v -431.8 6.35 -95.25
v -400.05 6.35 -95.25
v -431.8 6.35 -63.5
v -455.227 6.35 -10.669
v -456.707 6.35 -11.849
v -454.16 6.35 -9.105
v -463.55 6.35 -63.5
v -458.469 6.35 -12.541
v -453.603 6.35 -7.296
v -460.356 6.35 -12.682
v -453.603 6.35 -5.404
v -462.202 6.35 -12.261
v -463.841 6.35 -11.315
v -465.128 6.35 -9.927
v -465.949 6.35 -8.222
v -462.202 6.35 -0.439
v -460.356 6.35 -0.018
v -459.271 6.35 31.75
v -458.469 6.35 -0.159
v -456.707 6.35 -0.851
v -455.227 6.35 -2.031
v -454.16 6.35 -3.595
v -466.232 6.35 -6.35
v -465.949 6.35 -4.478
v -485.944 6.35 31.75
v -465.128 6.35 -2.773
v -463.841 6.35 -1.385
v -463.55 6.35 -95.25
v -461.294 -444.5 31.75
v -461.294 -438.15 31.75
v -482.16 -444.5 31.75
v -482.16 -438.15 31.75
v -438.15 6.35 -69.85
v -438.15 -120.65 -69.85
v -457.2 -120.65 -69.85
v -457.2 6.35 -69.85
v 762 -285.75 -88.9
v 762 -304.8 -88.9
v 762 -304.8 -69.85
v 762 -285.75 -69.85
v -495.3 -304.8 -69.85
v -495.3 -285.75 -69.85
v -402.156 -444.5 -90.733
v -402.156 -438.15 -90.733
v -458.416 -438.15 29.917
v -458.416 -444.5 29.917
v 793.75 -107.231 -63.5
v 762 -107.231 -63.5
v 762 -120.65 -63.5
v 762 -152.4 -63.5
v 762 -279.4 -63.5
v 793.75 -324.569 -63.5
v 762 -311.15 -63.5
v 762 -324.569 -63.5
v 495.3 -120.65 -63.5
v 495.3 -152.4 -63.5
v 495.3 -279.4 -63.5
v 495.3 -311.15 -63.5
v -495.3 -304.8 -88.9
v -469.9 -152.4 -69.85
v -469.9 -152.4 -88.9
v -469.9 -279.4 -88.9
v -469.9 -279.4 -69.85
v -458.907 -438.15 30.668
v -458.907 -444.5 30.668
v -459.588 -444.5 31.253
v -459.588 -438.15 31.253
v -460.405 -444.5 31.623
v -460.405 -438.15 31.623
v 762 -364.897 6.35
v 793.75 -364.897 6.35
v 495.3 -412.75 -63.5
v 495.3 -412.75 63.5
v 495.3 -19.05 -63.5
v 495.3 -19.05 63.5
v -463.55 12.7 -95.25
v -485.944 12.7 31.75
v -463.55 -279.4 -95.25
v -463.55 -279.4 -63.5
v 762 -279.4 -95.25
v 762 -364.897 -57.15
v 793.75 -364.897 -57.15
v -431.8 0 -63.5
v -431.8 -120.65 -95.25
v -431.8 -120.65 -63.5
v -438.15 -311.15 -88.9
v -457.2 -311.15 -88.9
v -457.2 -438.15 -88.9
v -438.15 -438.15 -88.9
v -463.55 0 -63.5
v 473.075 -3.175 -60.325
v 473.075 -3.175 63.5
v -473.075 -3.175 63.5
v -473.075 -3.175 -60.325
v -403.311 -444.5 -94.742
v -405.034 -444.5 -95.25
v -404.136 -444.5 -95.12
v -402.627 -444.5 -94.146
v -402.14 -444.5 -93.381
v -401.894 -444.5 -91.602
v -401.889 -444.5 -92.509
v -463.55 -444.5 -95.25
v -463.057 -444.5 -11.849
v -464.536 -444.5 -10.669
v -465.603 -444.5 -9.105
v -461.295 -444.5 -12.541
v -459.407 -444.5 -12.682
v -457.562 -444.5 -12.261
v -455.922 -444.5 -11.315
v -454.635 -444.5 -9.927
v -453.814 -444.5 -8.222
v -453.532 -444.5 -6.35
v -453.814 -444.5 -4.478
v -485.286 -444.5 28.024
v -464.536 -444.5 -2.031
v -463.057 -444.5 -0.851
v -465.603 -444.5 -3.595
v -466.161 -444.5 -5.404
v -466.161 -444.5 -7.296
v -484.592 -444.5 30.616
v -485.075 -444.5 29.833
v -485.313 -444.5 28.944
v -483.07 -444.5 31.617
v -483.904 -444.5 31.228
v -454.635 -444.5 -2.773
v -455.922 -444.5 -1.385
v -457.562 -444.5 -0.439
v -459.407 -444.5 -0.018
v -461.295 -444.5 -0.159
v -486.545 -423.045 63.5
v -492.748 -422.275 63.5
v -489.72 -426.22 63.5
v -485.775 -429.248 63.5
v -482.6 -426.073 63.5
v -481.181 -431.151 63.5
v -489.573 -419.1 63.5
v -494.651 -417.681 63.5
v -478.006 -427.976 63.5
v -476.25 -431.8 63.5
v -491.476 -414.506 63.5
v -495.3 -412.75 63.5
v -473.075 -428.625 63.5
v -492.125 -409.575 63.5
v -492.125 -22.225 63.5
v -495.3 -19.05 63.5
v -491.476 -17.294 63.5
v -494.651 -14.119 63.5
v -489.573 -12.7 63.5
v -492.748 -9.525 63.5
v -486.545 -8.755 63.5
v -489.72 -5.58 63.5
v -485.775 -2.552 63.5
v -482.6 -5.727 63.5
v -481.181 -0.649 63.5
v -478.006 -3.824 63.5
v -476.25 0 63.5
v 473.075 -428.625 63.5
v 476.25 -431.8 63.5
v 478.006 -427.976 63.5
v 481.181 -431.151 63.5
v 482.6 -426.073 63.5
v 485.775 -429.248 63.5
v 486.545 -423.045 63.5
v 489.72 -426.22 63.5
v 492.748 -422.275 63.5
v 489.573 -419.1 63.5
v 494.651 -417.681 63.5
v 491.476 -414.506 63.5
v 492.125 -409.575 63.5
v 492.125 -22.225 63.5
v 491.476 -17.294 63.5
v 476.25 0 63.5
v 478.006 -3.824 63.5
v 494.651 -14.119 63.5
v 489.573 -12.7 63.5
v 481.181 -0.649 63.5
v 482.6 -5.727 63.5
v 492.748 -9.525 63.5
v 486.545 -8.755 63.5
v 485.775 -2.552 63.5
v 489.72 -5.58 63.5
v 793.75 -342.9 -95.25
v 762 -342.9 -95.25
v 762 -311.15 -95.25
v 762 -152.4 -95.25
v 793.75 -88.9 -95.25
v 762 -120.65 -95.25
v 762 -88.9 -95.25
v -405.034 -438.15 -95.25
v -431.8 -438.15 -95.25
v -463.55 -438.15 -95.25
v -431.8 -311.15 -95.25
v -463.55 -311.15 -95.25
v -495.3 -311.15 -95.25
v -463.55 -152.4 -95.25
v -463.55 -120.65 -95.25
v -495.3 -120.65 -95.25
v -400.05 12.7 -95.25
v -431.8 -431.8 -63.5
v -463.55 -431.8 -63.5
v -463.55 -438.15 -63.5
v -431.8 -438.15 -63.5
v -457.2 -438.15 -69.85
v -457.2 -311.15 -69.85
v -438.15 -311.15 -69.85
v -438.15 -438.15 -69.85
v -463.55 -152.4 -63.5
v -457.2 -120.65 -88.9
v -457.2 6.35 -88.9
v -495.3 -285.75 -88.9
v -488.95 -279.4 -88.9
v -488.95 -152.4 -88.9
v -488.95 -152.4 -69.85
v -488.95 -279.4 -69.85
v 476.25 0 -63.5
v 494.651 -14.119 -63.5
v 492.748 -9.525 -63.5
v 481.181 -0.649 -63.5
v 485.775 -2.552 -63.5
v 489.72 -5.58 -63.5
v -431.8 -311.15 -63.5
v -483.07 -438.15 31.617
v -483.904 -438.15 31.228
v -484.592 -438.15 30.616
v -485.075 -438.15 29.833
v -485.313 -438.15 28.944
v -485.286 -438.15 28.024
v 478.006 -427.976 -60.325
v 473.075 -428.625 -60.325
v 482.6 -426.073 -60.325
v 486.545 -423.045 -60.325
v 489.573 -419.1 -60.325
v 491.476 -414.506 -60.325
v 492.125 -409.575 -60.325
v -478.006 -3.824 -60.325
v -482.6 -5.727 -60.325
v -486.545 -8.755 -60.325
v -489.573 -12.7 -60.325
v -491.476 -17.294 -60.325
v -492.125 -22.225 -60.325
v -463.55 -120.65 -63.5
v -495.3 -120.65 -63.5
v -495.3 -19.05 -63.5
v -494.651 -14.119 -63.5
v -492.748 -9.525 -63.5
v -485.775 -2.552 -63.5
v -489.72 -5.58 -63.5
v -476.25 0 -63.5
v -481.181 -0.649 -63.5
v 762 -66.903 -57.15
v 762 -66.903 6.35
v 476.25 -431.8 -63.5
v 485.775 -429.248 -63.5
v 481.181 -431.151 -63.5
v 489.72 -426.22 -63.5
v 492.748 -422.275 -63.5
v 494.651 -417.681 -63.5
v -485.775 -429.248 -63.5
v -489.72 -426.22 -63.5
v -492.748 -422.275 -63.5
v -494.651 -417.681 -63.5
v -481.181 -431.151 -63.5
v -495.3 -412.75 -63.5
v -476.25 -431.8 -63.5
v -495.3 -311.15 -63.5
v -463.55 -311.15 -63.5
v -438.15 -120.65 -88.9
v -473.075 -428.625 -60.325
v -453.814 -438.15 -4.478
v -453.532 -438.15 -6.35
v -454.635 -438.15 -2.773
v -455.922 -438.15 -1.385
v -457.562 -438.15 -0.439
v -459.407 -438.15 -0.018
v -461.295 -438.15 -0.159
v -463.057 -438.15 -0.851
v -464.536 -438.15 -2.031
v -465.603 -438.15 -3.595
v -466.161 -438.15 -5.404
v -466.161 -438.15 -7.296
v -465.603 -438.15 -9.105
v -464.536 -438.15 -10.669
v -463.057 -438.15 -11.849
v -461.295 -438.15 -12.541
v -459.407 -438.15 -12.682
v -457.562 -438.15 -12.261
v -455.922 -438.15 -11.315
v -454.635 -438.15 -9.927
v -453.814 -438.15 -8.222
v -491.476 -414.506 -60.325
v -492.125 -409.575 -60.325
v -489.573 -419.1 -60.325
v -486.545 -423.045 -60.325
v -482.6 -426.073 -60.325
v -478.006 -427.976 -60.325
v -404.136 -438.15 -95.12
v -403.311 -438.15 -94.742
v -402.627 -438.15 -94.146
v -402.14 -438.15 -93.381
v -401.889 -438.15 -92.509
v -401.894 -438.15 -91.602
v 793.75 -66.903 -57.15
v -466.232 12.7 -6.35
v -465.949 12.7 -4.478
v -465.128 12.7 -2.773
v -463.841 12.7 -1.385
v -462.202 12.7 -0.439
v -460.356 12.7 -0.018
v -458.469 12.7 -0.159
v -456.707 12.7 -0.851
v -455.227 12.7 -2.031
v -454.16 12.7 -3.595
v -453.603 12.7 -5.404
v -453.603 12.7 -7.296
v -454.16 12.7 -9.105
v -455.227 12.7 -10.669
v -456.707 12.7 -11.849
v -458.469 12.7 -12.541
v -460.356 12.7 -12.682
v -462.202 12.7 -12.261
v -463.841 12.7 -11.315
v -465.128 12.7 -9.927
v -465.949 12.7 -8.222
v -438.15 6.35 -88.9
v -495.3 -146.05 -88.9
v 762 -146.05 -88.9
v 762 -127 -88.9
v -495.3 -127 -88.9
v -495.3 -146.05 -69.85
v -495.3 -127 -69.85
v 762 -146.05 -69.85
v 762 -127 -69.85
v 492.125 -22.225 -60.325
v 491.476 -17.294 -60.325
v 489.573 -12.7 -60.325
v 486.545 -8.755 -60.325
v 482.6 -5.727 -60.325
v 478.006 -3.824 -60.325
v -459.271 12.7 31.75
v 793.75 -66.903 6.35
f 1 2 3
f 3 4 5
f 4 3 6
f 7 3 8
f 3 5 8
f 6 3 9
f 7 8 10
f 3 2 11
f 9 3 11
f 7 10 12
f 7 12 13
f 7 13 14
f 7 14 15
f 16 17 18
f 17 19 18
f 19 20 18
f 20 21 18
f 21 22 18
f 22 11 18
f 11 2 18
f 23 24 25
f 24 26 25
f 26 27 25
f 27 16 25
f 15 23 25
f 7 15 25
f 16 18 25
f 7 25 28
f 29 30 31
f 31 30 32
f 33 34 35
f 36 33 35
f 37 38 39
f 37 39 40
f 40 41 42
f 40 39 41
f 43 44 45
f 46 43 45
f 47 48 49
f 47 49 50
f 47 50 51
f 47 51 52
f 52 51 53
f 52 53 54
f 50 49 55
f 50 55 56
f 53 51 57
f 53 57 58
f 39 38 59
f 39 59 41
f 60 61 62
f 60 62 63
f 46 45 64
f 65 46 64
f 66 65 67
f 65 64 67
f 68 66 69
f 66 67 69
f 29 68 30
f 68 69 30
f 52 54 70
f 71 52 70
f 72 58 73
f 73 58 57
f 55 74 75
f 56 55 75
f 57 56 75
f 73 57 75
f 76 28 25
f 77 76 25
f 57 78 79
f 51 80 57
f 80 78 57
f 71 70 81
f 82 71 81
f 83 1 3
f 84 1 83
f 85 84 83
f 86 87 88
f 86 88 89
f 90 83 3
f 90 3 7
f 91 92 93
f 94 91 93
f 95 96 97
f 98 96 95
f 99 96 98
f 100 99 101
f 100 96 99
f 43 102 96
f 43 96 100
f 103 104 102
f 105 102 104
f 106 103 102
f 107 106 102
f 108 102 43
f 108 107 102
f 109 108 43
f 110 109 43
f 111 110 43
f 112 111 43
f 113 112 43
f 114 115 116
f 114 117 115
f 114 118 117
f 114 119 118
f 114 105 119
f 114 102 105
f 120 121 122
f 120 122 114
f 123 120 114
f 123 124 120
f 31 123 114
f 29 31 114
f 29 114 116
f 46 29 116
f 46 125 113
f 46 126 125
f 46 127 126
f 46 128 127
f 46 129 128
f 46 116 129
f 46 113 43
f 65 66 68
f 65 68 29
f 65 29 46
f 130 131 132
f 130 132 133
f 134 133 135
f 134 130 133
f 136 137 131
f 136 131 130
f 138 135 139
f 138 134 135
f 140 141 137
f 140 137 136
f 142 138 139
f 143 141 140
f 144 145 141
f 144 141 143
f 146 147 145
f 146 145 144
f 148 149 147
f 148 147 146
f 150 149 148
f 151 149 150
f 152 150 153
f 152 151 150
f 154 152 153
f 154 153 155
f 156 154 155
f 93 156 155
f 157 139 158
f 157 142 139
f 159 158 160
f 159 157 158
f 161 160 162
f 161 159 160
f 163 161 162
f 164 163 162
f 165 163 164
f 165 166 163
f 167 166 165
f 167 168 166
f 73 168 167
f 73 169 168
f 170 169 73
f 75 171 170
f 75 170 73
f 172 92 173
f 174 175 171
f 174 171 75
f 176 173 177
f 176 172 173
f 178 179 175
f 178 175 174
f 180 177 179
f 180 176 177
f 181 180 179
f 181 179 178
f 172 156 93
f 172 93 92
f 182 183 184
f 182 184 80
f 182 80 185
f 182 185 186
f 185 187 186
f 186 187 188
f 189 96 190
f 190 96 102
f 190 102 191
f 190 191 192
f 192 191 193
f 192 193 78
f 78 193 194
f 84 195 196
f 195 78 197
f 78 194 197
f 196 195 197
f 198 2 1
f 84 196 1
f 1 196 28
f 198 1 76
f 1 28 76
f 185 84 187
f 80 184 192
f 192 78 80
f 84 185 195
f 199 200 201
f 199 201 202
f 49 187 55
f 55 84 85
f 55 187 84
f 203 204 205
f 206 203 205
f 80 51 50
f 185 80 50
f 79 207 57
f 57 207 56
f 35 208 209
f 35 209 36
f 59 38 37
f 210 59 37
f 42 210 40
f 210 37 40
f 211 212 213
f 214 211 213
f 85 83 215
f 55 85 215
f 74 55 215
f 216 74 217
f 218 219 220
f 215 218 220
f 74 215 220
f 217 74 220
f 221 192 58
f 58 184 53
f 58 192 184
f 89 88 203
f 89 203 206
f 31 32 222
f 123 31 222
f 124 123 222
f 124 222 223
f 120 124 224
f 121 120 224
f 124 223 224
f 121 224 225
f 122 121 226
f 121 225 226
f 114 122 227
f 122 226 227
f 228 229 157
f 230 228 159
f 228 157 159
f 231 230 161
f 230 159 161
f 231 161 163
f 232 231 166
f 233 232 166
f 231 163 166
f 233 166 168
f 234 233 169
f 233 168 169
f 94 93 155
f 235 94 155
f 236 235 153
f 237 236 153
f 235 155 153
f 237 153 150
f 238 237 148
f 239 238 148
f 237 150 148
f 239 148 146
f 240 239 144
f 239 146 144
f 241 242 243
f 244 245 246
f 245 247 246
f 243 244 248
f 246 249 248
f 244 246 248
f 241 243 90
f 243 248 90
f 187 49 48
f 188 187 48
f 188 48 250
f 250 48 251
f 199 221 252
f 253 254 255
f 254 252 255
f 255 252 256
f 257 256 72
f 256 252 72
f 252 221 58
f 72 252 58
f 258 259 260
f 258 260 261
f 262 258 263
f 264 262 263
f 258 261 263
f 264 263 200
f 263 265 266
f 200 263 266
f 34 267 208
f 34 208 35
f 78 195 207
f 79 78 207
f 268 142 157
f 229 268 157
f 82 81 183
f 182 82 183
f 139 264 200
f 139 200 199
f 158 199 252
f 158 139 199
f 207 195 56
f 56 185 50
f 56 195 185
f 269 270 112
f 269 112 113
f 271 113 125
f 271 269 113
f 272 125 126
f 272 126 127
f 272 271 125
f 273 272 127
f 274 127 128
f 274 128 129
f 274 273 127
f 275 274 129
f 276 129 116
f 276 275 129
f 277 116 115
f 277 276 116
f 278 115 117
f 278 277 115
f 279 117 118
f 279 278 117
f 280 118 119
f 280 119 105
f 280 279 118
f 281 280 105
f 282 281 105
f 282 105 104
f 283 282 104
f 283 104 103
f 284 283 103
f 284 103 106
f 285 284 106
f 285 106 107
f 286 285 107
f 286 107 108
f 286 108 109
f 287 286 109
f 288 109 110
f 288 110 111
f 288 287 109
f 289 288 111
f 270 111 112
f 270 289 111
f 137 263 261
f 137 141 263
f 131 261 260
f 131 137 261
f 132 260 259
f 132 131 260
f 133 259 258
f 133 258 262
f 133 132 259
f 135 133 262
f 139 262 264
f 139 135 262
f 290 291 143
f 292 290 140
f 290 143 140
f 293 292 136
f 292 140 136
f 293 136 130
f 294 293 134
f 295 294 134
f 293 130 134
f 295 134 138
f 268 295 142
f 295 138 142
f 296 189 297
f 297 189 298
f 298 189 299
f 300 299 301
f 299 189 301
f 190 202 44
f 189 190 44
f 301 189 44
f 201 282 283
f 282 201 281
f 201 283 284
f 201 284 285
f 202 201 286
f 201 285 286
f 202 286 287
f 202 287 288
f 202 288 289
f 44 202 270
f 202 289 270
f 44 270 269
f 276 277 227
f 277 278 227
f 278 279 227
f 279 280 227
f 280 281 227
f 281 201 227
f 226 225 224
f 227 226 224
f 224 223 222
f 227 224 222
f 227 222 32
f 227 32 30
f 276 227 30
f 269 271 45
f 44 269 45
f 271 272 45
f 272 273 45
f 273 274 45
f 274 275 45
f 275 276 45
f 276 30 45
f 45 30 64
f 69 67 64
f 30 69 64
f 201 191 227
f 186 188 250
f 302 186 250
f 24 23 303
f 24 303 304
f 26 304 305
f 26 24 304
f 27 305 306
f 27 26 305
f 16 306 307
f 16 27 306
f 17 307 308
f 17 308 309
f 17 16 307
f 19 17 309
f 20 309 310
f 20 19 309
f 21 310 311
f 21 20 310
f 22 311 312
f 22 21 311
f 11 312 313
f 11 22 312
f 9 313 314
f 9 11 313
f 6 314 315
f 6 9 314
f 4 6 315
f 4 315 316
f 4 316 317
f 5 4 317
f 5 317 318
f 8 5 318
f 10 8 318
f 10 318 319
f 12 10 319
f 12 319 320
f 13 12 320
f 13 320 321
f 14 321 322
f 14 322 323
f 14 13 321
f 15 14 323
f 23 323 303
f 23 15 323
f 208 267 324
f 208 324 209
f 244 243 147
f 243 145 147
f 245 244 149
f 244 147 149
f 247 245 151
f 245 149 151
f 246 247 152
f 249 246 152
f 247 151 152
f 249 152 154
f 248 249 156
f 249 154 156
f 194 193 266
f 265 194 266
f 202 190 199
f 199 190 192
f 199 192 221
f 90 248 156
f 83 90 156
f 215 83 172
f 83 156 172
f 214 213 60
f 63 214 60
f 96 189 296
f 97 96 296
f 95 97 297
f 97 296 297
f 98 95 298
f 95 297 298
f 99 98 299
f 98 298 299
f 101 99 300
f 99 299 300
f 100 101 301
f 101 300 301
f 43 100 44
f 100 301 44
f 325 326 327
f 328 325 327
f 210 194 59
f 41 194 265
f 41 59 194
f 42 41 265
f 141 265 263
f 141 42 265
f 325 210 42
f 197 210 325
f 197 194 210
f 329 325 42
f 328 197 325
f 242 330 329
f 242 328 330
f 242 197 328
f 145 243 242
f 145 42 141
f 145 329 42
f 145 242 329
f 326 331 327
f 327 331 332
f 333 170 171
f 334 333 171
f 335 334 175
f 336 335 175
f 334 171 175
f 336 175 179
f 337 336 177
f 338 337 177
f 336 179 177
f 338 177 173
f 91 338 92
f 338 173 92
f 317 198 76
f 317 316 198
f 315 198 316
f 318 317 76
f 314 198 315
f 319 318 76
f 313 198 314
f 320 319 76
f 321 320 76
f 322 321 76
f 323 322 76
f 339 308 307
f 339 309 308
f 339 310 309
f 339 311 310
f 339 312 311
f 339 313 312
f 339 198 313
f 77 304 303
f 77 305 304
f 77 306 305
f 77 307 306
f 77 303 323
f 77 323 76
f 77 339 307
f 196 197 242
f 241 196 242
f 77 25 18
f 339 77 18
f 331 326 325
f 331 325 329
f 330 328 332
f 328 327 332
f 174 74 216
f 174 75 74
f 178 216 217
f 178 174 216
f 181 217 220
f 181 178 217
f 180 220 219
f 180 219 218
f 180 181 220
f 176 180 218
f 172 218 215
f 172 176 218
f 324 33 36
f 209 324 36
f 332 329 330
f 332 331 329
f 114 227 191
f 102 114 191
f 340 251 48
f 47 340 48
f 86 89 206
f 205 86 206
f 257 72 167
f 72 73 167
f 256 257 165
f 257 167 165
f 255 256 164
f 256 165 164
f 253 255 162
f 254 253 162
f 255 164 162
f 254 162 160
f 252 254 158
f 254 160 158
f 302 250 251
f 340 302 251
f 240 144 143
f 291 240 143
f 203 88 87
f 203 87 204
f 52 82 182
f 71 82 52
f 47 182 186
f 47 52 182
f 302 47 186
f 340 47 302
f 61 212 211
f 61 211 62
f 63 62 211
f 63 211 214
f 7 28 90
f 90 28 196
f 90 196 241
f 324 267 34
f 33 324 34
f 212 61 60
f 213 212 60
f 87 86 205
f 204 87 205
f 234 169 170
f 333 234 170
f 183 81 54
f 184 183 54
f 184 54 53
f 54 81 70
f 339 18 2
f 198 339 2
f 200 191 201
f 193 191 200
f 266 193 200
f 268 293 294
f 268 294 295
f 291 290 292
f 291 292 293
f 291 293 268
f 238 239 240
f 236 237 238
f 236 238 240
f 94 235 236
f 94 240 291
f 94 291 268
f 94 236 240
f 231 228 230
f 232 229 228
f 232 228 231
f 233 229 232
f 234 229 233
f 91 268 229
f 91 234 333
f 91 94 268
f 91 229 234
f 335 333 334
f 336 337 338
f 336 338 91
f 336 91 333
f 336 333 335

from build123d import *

# Parameters (mm, degrees)
F0_W          = 990.6
F0_H          = 127
F1_DEPTH      = 431.8
F2_R          = 19.05
F4_DEPTH      = 123.825
F5_W          = 31.75
F5_H          = 31.75
F5_W_2        = 19.05
F5_H_2        = 19.05
F6_DEPTH      = 762
F6_DEPTH_BACK = 495.3
F7_W          = 31.75
F7_H          = 31.75
F7_W_2        = 19.0499997139
F7_H_2        = 19.0499997139
F8_DEPTH      = 127
F10_W         = 31.75
F10_H         = 31.75
F10_W_2       = 19.05
F10_H_2       = 19.05
F11_DEPTH     = 127
F12_W         = 31.75
F12_H         = 31.75
F12_W_2       = 19.0499814987
F12_H_2       = 19.0499814987
F13_DEPTH     = 127
F15_R         = 6.35
F16_DEPTH     = 6.35
F18_R         = 6.35
F19_DEPTH     = 6.35
F22_DEPTH     = 31.75


with BuildPart() as f1:
    # F0 (on Front) → F1 (new body)
    with BuildSketch(Plane.XZ):
        Rectangle(F0_W, F0_H)
    extrude(amount=F1_DEPTH)

    # F2
    f2_edges = [f1.edges().sort_by_distance(p)[0] for p in [
        (495.3, -431.8, 0),
        (495.3, 0, 0),
        (-495.3, -431.8, 0),
        (-495.3, 0, 0),
    ]]
    fillet(f2_edges, radius=F2_R)

    # F3 (on face) → F4 (cut)
    with BuildSketch(Plane.XY.offset(63.5)):
        with BuildLine():
            ThreePointArc((492.125, -22.225), (486.5453841816, -8.7546158184), (473.075, -3.175))
            Line((473.075, -3.175), (-473.075, -3.175))
            ThreePointArc((-473.075, -3.175), (-486.5453841816, -8.7546158184), (-492.125, -22.225))
            Line((-492.125, -22.225), (-492.125, -409.575))
            ThreePointArc((-492.125, -409.575), (-486.5453841816, -423.0453841816), (-473.075, -428.625))
            Line((-473.075, -428.625), (473.075, -428.625))
            ThreePointArc((473.075, -428.625), (486.5453841816, -423.0453841816), (492.125, -409.575))
            Line((492.125, -409.575), (492.125, -22.225))
        make_face()
    extrude(amount=-F4_DEPTH, mode=Mode.SUBTRACT)

    # F5 (on Right) → F6 (join, two sides)
    with BuildSketch(Plane.YZ) as f6_sk:
        with Locations((-295.275, -79.375)):
            Rectangle(F5_W, F5_H)
        with Locations((-295.275, -79.375)):
            Rectangle(F5_W_2, F5_H_2, mode=Mode.SUBTRACT)
        with Locations((-136.525, -79.375)):
            Rectangle(F5_W, F5_H)
        with Locations((-136.525, -79.375)):
            Rectangle(F5_W_2, F5_H_2, mode=Mode.SUBTRACT)
    extrude(amount=F6_DEPTH)
    extrude(f6_sk.sketch, amount=-F6_DEPTH_BACK)

    # F7 (on face) → F8 (join)
    with BuildSketch(Plane.XZ.offset(152.4)):
        with Locations((-479.425, -79.375)):
            Rectangle(F7_W, F7_H)
        with Locations((-479.425, -79.375)):
            Rectangle(F7_W_2, F7_H_2, mode=Mode.SUBTRACT)
    extrude(amount=F8_DEPTH)

    # F10 (on face) → F11 (join)
    with BuildSketch(Plane.XZ.offset(311.15)):
        with Locations((-447.675, -79.375)):
            Rectangle(F10_W, F10_H)
        with Locations((-447.675, -79.375)):
            Rectangle(F10_W_2, F10_H_2, mode=Mode.SUBTRACT)
    extrude(amount=F11_DEPTH)

    # F12 (on face) → F13 (join)
    with BuildSketch(Plane(origin=(0, -120.65, 0), x_dir=(-1, 0, 0), z_dir=(0, 1, 0))):
        with Locations((447.675, -79.375)):
            Rectangle(F12_W, F12_H)
        with Locations((447.675, -79.375)):
            Rectangle(F12_W_2, F12_H_2, mode=Mode.SUBTRACT)
    extrude(amount=F13_DEPTH)

    # F15 (on offset) → F16 (join)
    with BuildSketch(Plane.XZ.offset(438.15)):
        with BuildLine():
            Line((-485.2864735093, 28.0236670359), (-463.55, -95.25))
            Line((-463.55, -95.25), (-405.0337517073, -95.25))
            ThreePointArc((-405.0337517073, -95.25), (-402.3559838669, -93.7809262565), (-402.1562244835, -90.733187019))
            Line((-402.1562244835, -90.733187019), (-458.4162434399, 29.916812981))
            ThreePointArc((-458.4162434399, 29.916812981), (-459.5878444072, 31.2527678405), (-461.2937706637, 31.75))
            Line((-461.2937706637, 31.75), (-482.1597088935, 31.75))
            ThreePointArc((-482.1597088935, 31.75), (-484.5919000004, 30.6158506608), (-485.2864735093, 28.0236670359))
        make_face()
        with Locations((-459.8815916286, -6.35)):
            Circle(F15_R, mode=Mode.SUBTRACT)
    extrude(amount=F16_DEPTH)

    # F18 (on offset) → F19 (join)
    with BuildSketch(Plane(origin=(0, 6.35, 0), x_dir=(-1, 0, 0), z_dir=(0, 1, 0))):
        Polygon((400.05, -95.25), (463.55, -95.25), (485.94352655, 31.75), (459.2710725857, 31.75), align=None)
        with Locations((459.8815916286, -6.35)):
            Circle(F18_R, mode=Mode.SUBTRACT)
    extrude(amount=F19_DEPTH)

    # F21 (on offset) → F22 (join)
    with BuildSketch(Plane.YZ.offset(762)):
        Polygon((-324.5691289532, -63.5), (-364.8970452561, 6.35), (-364.8970452561, -57.15), (-342.9, -95.25), (-88.9, -95.25), (-66.9029547439, -57.15), (-66.9029547439, 6.35), (-107.2308710468, -63.5), align=None)
    extrude(amount=F22_DEPTH)


solid = f1.part
